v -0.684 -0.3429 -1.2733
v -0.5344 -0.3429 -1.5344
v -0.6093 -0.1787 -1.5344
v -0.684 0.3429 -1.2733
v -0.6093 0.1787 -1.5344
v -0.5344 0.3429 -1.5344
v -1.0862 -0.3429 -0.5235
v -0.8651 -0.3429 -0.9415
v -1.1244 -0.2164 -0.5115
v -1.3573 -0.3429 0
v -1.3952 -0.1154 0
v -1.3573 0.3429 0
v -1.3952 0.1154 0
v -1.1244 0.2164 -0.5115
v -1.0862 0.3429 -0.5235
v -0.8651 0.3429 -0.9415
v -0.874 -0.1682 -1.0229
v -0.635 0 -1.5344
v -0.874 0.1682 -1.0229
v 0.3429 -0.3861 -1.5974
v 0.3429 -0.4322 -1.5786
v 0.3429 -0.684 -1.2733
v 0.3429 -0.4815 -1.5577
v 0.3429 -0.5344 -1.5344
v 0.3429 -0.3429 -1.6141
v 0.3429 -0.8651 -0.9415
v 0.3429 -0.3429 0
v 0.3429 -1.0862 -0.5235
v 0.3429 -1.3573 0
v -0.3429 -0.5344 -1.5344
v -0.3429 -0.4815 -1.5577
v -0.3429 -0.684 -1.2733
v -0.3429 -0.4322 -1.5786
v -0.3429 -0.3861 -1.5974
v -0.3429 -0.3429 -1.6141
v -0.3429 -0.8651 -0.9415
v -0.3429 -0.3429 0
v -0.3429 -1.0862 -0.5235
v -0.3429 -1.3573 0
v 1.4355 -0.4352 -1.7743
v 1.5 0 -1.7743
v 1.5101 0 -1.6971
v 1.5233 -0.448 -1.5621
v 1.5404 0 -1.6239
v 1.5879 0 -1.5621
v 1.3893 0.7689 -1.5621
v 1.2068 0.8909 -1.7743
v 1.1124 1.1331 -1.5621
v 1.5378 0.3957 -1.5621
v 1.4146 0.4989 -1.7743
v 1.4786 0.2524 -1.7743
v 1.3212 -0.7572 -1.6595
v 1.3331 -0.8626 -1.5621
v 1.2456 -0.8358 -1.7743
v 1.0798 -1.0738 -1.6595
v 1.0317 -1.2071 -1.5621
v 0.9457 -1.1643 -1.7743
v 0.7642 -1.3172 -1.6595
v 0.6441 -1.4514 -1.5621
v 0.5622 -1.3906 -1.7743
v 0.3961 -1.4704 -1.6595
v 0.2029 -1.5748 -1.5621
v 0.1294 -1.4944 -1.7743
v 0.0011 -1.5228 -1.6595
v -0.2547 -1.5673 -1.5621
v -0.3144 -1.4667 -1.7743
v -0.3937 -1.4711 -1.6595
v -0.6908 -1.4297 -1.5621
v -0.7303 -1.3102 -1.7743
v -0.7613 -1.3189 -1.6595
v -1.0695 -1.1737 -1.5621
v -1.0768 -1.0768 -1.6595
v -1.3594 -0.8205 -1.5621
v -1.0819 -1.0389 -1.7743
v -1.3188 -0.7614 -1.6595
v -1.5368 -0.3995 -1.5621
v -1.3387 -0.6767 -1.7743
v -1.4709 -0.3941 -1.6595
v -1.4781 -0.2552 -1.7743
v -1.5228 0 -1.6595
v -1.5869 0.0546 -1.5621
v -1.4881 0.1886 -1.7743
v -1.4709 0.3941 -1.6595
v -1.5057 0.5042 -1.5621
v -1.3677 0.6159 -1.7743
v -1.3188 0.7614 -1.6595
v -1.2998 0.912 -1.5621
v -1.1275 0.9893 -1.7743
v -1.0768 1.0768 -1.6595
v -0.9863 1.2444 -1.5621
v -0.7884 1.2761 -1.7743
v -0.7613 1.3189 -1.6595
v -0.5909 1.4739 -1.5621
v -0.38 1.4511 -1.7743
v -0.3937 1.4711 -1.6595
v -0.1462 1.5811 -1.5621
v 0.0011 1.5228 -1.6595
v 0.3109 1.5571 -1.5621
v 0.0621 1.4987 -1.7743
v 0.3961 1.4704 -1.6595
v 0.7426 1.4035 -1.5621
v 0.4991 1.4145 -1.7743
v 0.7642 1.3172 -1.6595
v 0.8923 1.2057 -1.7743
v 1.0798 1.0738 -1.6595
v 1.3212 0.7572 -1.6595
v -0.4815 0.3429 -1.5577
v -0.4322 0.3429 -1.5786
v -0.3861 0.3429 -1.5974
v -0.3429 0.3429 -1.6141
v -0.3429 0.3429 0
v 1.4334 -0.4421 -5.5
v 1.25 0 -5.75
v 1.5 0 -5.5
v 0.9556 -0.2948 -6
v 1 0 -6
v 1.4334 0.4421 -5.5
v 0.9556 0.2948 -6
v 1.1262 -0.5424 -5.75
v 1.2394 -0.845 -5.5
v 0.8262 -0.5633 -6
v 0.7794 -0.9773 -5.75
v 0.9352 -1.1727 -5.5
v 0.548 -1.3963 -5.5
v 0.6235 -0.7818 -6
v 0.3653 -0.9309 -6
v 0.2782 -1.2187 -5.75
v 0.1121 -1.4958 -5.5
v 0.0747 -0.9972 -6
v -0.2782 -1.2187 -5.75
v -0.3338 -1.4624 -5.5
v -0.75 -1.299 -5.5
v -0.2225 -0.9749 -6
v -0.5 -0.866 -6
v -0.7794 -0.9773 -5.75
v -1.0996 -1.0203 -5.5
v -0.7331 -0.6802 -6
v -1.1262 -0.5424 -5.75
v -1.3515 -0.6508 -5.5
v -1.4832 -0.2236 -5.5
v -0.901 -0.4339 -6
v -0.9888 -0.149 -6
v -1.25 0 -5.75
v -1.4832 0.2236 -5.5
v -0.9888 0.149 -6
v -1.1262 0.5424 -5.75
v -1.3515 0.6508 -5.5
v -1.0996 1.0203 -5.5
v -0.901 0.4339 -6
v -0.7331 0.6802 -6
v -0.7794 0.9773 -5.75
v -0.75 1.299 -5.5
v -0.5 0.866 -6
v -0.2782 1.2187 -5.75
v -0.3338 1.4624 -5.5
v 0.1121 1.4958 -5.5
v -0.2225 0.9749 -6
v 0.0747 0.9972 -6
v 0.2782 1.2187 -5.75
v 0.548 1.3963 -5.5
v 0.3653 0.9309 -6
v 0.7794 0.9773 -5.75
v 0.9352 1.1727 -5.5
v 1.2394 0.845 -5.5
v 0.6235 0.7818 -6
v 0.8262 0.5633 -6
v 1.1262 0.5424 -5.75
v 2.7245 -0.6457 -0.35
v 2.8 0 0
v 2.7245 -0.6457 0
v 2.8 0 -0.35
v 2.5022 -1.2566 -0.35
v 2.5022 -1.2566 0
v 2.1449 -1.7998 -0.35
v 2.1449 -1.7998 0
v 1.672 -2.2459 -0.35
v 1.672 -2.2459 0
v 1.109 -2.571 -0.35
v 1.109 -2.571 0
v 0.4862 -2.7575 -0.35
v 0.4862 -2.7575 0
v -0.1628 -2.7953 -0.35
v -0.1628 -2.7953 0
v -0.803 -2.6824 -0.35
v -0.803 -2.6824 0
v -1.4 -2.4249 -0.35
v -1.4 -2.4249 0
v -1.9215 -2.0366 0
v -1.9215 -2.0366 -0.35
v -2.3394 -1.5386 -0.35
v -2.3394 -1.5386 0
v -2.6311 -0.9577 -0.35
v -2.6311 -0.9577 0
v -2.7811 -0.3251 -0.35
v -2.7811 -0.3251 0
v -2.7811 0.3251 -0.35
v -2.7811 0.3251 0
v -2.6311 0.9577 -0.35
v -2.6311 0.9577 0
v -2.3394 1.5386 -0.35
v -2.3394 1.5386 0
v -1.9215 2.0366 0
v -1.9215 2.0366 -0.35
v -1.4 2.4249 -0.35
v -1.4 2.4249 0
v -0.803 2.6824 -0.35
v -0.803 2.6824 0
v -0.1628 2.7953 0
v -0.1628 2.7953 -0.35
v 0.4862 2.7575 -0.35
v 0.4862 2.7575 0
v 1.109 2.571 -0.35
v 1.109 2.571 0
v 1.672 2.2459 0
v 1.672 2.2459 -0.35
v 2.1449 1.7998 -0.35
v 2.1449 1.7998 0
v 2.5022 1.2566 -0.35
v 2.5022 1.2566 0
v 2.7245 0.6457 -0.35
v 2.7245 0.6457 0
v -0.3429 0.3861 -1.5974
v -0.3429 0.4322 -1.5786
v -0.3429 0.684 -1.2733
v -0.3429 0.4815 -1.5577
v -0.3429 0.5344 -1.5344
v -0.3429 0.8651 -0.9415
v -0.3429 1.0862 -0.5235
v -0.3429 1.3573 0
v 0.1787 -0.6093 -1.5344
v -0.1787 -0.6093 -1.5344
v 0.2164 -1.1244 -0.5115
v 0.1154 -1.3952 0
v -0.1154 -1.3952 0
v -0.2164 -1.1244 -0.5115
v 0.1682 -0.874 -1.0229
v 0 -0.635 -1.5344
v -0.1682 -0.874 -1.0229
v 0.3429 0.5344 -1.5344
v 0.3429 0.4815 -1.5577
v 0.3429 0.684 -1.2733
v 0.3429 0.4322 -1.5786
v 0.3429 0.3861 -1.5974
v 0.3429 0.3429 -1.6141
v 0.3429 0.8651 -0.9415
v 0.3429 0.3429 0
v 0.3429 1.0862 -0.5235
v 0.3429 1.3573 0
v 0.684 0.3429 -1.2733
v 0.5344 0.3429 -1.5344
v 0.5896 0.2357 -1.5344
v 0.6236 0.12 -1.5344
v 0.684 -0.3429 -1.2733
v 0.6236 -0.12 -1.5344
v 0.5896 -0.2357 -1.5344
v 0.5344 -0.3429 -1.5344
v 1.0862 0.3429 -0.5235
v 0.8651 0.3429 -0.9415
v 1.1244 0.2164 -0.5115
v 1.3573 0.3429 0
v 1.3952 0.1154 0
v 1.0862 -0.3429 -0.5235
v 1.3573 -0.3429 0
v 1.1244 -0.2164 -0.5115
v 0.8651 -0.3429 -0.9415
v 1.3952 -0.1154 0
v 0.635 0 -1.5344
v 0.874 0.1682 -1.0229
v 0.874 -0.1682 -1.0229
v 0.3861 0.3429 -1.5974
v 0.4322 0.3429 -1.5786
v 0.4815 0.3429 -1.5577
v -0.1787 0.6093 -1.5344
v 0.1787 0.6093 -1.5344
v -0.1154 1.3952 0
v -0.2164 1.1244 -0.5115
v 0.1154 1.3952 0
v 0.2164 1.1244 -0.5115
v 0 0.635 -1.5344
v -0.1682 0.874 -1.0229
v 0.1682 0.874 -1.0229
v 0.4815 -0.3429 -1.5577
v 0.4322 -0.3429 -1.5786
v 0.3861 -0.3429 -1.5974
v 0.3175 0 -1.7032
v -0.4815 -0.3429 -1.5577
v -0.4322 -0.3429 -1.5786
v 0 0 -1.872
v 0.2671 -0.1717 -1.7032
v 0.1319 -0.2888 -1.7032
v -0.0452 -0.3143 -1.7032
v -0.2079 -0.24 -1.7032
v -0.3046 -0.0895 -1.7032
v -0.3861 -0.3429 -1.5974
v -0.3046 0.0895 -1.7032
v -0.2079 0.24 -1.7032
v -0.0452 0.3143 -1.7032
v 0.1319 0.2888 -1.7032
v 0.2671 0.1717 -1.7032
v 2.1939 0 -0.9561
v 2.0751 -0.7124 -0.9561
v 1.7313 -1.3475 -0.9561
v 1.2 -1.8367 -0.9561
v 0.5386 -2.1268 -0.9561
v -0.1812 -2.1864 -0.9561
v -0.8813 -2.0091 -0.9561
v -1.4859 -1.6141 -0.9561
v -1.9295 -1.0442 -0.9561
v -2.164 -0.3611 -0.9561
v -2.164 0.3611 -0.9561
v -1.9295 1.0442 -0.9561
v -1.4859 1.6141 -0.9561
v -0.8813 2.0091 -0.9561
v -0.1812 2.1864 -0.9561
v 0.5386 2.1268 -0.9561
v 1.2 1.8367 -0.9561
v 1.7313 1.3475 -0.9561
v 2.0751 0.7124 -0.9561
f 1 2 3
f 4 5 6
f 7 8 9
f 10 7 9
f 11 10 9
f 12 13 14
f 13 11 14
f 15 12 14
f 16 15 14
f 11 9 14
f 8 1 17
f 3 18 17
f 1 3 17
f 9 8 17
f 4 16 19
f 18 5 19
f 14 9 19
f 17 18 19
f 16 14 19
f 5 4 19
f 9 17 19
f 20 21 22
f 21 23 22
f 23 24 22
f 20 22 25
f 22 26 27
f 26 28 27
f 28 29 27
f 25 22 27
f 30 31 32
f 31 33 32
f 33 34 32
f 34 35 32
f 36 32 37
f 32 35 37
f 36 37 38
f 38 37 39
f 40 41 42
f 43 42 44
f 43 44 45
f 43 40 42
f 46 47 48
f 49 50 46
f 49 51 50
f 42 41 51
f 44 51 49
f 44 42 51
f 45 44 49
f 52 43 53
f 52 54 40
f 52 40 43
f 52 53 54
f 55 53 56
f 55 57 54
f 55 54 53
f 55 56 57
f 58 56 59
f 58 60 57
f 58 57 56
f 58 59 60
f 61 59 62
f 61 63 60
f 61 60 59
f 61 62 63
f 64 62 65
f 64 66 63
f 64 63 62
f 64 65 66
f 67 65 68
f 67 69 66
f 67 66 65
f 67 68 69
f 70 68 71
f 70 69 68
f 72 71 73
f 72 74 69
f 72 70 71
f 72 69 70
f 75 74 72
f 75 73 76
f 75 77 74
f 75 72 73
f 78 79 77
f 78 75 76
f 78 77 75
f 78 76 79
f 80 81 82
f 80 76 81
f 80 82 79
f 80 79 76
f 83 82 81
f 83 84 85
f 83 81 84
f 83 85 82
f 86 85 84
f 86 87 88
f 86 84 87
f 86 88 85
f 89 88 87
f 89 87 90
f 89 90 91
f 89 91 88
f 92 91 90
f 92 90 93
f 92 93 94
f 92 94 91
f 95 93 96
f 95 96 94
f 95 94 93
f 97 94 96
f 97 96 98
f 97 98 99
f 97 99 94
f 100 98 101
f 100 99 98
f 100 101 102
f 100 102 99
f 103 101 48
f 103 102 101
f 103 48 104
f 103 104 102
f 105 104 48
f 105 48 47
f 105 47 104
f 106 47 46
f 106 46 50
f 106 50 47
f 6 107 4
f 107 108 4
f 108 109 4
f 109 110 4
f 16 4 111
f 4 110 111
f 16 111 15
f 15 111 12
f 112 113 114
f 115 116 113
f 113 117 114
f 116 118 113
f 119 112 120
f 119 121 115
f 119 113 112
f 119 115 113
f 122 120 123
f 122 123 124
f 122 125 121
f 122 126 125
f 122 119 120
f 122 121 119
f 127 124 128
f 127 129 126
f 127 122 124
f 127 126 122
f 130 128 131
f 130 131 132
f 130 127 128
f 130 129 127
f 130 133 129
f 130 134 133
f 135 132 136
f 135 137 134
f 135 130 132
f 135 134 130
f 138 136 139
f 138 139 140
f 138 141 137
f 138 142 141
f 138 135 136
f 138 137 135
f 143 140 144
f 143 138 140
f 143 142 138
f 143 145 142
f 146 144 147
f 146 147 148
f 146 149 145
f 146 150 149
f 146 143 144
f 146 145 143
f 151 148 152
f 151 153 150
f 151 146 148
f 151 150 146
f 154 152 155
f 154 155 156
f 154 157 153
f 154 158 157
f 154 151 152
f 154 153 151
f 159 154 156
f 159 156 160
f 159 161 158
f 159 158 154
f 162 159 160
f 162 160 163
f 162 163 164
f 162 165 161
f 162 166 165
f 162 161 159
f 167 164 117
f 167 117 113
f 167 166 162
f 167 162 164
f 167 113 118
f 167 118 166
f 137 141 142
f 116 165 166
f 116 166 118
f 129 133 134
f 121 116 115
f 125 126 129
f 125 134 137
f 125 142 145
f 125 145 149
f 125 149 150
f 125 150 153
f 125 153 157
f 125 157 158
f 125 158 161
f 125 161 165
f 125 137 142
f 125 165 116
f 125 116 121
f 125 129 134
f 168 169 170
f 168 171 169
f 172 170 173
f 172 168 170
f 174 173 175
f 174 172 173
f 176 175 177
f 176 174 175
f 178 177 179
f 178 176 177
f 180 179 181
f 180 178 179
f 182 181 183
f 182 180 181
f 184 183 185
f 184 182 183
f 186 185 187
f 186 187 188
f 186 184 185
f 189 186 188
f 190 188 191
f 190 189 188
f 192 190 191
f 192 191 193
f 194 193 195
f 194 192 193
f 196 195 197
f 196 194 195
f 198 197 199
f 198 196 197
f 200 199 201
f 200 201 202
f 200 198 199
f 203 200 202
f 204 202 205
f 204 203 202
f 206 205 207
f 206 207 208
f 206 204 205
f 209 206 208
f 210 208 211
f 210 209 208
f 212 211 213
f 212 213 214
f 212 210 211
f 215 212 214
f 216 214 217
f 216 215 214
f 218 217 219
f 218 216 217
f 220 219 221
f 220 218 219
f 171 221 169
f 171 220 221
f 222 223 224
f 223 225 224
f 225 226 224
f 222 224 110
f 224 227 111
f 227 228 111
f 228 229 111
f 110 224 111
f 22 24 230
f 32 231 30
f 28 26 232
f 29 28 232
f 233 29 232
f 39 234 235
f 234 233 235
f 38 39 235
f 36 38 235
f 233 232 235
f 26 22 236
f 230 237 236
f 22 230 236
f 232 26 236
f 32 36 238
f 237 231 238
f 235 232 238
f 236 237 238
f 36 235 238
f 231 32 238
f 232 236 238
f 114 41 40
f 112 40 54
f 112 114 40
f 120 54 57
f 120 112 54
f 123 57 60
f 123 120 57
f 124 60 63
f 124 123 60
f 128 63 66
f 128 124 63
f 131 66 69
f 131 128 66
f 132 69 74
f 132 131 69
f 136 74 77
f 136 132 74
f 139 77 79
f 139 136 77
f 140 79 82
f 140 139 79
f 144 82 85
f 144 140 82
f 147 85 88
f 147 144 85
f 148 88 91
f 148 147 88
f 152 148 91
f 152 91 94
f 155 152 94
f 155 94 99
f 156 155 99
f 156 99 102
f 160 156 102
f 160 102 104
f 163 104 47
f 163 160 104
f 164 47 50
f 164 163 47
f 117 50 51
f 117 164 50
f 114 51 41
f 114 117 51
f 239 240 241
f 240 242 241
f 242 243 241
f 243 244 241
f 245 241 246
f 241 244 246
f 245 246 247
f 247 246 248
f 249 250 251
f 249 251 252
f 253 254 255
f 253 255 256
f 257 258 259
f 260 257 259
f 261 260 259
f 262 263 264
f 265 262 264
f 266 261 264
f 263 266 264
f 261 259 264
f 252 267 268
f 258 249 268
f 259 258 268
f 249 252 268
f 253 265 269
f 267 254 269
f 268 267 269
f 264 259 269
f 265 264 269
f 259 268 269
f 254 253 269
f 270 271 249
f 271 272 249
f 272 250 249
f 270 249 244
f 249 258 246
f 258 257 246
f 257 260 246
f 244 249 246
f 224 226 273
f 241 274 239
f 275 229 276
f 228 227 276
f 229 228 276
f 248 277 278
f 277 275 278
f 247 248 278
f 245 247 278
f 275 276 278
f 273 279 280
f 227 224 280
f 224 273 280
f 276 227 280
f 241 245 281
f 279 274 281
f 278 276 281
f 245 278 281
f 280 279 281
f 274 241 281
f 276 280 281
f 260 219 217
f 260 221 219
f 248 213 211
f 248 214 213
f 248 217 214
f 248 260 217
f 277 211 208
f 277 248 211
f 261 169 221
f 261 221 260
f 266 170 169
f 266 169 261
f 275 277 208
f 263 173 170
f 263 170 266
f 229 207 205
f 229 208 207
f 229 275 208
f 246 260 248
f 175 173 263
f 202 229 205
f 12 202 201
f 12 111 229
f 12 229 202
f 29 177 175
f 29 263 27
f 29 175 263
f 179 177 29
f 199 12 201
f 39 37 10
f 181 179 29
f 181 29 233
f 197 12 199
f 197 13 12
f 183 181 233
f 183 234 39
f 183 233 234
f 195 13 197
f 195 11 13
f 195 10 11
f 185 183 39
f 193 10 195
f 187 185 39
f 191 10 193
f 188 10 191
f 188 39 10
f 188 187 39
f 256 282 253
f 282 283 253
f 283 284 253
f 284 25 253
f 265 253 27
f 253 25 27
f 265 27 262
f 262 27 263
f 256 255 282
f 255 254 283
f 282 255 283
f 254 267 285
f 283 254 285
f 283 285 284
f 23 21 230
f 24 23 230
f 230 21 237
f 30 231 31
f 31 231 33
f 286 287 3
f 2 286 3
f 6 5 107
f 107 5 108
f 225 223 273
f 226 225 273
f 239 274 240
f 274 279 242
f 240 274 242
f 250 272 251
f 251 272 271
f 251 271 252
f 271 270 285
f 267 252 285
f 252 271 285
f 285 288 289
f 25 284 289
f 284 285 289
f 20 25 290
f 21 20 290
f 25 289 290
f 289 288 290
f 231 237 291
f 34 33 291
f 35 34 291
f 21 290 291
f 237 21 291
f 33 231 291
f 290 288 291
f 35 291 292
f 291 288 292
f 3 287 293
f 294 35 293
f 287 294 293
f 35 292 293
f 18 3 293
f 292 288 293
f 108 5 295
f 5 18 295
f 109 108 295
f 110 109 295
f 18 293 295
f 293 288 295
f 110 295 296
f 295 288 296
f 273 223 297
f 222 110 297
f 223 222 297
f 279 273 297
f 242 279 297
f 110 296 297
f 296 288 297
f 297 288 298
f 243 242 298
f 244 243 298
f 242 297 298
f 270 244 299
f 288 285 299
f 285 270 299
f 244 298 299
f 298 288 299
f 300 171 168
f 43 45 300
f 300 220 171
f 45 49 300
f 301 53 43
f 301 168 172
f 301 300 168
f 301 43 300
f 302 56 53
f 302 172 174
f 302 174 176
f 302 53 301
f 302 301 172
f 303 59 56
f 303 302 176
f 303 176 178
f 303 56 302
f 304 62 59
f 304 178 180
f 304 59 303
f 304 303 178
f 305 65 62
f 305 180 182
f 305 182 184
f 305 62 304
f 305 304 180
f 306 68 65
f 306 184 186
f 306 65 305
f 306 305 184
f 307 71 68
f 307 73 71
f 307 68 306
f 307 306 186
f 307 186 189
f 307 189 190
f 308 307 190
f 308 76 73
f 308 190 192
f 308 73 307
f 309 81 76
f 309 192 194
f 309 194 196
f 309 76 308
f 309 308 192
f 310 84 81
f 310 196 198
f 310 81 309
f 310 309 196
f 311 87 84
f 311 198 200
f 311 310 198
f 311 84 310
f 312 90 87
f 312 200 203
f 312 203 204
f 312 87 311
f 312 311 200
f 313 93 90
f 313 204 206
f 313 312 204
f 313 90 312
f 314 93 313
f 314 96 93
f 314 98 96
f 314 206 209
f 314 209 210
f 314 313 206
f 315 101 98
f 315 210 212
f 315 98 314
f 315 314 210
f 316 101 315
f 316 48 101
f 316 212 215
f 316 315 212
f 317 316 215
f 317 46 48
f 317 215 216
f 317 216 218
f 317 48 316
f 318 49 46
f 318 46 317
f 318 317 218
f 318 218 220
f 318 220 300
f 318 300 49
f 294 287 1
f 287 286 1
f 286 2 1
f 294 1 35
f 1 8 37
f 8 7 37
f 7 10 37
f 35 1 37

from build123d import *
from build123d.topology import SkipClean

# Parameters (mm, degrees)
CHAMFERROD_SIZE   = 0.5
CROSS_DEPTH       = 2.8
CIRPATTERN1_COUNT = 4
FILLET1_R         = 0.3


with BuildPart() as part:
    # Sketch1 → RevolveBase (revolve)
    with BuildSketch(Plane(origin=(0, 0, 0), x_dir=(0, 0, -1), z_dir=(1, 0, 0)), mode=Mode.PRIVATE) as revolvebase_sk:
        Polygon((0, 0), (0, 2.8), (0.35, 2.8), (1.65, 1.5), (6, 1.5), (6, 0), align=None)
    revolve(revolvebase_sk.sketch.rotate(Axis((0, 0, 0), (0, 0, -1)), 90), axis=Axis((0, 0, 0), (0, 0, -1)))

    # ChamferRod
    chamferrod_edges = [part.edges().sort_by_distance(p)[0] for p in [
        (-1.5, 0, -6),
    ]]
    chamfer(chamferrod_edges, length=CHAMFERROD_SIZE)

    # Sketch3 → Cross (cut)
    with BuildSketch(Plane.XY):
        with BuildLine():
            Line((-0.342946789, 0), (0.342946789, 0))
            Line((0.342946789, 0), (0.342946789, 1.357345756))
            ThreePointArc((0.342946789, 1.357345756), (0, 1.4), (-0.342946789, 1.357345756))
            Line((-0.342946789, 1.357345756), (-0.342946789, 0))
        make_face()
    cross = extrude(amount=-CROSS_DEPTH, mode=Mode.SUBTRACT)

    # CirPattern1: Cross ×4 about axis
    cirpattern1_axis = Axis((0, 0, 0), (0, 0, 1))
    for i in range(1, CIRPATTERN1_COUNT):
        add(cross.rotate(cirpattern1_axis, i * 360 / CIRPATTERN1_COUNT), mode=Mode.SUBTRACT)

    # Sketch5 → RevolveRod (revolve)
    with BuildSketch(Plane(origin=(0, 0, 0), x_dir=(0, 0, -1), z_dir=(1, 0, 0)), mode=Mode.PRIVATE) as revolverod_sk:
        Polygon((2.8, 0), (2.8, 1.9), (0, 1.9), (0, 1.4), (1.534352627, 0.635), (1.871988116, 0), align=None)
    revolve(revolverod_sk.sketch.rotate(Axis((0, 0, 0), (0, 0, -1)), 90), axis=Axis((0, 0, 0), (0, 0, -1)))

    # Sketch7 → CutRod (revolve, cut)
    with SkipClean():  # the faces are left unmerged after this step: merging them gives an invalid solid
        with BuildSketch(Plane(origin=(0, 0, 0), x_dir=(0, 0, -1), z_dir=(1, 0, 0)), mode=Mode.PRIVATE) as cutrod_sk:
            Polygon((-21.85, 25), (1.65, 1.5), (2.8, 1.5), (2.8, 25), align=None)
        revolve(cutrod_sk.sketch.rotate(Axis((0, 0, 0), (0, 0, -1)), 90), axis=Axis((0, 0, 0), (0, 0, -1)), mode=Mode.SUBTRACT)

    # Fillet1
    fillet1_edges = [part.edges().sort_by_distance(p)[0] for p in [
        (-1.5, 0, -1.65),
    ]]
    fillet(fillet1_edges, radius=FILLET1_R)


solid = part.part
